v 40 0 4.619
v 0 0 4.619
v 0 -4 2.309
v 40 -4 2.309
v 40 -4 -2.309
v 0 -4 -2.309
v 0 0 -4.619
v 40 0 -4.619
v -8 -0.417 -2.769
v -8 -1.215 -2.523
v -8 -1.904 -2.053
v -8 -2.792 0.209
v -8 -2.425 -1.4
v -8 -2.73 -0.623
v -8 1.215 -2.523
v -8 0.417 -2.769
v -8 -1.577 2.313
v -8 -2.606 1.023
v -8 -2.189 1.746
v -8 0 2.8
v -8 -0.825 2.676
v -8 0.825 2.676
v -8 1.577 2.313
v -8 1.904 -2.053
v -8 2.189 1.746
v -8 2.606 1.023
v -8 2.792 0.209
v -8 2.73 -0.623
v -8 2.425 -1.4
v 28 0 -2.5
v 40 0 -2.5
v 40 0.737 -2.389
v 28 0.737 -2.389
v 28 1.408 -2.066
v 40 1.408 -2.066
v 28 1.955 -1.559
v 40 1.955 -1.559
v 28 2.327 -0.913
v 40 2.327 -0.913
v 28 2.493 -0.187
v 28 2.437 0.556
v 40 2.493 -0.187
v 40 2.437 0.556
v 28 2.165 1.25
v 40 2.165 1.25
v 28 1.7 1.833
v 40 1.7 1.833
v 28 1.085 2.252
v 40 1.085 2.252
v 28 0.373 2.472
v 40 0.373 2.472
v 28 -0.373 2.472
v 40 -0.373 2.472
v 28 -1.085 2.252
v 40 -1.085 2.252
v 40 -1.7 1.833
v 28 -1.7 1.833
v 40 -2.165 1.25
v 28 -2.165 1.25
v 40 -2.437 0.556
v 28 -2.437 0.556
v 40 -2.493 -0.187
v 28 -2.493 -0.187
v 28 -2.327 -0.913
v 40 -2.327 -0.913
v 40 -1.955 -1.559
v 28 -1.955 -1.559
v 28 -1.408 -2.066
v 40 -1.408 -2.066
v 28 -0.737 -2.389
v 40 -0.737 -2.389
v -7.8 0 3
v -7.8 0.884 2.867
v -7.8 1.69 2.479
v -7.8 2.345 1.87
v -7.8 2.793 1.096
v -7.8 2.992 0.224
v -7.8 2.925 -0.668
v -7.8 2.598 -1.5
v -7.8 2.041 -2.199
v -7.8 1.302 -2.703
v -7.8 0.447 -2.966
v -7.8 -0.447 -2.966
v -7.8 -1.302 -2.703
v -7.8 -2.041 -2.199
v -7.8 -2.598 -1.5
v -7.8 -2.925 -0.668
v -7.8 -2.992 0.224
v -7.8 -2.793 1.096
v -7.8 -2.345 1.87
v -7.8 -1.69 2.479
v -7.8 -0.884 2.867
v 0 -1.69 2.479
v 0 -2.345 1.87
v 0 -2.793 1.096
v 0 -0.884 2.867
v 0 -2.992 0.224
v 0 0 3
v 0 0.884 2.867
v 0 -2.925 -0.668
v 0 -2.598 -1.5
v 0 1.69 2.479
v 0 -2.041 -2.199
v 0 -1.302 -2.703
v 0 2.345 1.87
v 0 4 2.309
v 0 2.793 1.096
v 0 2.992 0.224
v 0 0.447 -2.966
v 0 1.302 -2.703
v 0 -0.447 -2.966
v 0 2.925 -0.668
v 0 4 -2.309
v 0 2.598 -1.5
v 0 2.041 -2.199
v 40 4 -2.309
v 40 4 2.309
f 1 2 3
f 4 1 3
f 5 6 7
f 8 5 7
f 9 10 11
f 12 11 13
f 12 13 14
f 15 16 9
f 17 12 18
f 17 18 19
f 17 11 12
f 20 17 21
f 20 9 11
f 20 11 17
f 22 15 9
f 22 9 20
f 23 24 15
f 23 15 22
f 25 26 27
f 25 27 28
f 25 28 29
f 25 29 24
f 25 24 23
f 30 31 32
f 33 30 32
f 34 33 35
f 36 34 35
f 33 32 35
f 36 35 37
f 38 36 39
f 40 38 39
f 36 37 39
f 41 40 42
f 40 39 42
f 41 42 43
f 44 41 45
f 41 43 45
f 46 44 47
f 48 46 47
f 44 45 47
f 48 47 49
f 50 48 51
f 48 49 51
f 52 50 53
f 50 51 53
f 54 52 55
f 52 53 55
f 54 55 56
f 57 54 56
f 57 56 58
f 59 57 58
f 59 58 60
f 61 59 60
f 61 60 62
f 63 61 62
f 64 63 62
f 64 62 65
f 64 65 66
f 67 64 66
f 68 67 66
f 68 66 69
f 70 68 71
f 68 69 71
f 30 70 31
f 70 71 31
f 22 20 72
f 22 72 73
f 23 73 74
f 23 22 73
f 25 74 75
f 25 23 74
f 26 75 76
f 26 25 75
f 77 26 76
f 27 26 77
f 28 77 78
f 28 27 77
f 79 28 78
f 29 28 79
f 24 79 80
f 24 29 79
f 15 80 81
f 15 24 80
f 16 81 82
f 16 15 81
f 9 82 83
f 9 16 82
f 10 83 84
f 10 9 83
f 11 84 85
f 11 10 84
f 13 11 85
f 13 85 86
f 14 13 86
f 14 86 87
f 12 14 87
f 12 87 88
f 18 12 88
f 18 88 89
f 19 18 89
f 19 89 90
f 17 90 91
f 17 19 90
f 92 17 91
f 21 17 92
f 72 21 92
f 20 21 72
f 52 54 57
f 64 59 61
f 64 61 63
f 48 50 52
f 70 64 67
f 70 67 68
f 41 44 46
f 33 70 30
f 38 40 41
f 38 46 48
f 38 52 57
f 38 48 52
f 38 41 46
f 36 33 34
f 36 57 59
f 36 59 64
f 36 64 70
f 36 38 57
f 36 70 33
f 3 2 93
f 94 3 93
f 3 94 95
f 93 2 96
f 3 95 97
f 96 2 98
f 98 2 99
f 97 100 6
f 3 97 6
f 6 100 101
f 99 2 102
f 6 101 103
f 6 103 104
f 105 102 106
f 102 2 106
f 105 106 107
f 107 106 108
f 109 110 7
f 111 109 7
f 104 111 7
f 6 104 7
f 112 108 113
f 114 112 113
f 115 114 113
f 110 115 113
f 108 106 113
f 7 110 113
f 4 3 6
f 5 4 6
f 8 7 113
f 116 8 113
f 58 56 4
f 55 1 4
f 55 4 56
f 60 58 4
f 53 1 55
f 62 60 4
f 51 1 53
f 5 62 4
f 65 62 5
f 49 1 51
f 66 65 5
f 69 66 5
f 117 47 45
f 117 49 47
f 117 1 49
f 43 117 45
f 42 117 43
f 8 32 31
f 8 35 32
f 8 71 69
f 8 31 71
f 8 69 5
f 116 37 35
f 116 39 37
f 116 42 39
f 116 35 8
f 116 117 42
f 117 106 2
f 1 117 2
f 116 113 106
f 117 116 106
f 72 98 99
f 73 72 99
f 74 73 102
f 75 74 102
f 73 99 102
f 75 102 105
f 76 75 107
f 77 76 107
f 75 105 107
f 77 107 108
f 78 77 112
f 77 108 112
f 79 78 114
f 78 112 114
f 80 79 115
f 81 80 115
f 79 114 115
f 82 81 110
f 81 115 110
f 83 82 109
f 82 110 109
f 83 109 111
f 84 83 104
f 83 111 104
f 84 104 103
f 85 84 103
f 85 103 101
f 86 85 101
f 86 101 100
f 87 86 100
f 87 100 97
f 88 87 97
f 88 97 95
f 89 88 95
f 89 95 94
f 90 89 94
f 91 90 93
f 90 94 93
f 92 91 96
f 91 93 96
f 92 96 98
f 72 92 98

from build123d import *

# Parameters (mm, degrees)
EXTRUDE_1_DEPTH     = 40
SKETCH_2_R          = 2.5
CUT_EXTRUDE_1_DEPTH = 12
SKETCH_3_R          = 3
EXTRUDE_2_DEPTH     = 8
CHAMFER_1_SIZE      = 0.2


with BuildPart() as part:
    # 草图1 → 凸台-拉伸1 (new body)
    with BuildSketch(Plane(origin=(0, 0, 0), x_dir=(0, 0, -1), z_dir=(1, 0, 0))):
        Polygon((4.618802154, 0), (2.309401077, 4), (-2.309401077, 4), (-4.618802154, 0), (-2.309401077, -4), (2.309401077, -4), align=None)
    extrude(amount=EXTRUDE_1_DEPTH)

    # 草图2 → 切除-拉伸1 (cut)
    with BuildSketch(Plane(origin=(40, 0, 0), x_dir=(0, 0, -1), z_dir=(1, 0, 0))):
        Circle(SKETCH_2_R)
    extrude(amount=-CUT_EXTRUDE_1_DEPTH, mode=Mode.SUBTRACT)

    # 草图3 → 凸台-拉伸2 (add)
    with BuildSketch(Plane.ZY):
        Circle(SKETCH_3_R)
    extrude(amount=EXTRUDE_2_DEPTH)

    # 倒角1
    chamfer_1_edges = [part.edges().sort_by_distance(p)[0] for p in [
        (-8, 0, -3),
    ]]
    chamfer(chamfer_1_edges, length=CHAMFER_1_SIZE)


solid = part.part
